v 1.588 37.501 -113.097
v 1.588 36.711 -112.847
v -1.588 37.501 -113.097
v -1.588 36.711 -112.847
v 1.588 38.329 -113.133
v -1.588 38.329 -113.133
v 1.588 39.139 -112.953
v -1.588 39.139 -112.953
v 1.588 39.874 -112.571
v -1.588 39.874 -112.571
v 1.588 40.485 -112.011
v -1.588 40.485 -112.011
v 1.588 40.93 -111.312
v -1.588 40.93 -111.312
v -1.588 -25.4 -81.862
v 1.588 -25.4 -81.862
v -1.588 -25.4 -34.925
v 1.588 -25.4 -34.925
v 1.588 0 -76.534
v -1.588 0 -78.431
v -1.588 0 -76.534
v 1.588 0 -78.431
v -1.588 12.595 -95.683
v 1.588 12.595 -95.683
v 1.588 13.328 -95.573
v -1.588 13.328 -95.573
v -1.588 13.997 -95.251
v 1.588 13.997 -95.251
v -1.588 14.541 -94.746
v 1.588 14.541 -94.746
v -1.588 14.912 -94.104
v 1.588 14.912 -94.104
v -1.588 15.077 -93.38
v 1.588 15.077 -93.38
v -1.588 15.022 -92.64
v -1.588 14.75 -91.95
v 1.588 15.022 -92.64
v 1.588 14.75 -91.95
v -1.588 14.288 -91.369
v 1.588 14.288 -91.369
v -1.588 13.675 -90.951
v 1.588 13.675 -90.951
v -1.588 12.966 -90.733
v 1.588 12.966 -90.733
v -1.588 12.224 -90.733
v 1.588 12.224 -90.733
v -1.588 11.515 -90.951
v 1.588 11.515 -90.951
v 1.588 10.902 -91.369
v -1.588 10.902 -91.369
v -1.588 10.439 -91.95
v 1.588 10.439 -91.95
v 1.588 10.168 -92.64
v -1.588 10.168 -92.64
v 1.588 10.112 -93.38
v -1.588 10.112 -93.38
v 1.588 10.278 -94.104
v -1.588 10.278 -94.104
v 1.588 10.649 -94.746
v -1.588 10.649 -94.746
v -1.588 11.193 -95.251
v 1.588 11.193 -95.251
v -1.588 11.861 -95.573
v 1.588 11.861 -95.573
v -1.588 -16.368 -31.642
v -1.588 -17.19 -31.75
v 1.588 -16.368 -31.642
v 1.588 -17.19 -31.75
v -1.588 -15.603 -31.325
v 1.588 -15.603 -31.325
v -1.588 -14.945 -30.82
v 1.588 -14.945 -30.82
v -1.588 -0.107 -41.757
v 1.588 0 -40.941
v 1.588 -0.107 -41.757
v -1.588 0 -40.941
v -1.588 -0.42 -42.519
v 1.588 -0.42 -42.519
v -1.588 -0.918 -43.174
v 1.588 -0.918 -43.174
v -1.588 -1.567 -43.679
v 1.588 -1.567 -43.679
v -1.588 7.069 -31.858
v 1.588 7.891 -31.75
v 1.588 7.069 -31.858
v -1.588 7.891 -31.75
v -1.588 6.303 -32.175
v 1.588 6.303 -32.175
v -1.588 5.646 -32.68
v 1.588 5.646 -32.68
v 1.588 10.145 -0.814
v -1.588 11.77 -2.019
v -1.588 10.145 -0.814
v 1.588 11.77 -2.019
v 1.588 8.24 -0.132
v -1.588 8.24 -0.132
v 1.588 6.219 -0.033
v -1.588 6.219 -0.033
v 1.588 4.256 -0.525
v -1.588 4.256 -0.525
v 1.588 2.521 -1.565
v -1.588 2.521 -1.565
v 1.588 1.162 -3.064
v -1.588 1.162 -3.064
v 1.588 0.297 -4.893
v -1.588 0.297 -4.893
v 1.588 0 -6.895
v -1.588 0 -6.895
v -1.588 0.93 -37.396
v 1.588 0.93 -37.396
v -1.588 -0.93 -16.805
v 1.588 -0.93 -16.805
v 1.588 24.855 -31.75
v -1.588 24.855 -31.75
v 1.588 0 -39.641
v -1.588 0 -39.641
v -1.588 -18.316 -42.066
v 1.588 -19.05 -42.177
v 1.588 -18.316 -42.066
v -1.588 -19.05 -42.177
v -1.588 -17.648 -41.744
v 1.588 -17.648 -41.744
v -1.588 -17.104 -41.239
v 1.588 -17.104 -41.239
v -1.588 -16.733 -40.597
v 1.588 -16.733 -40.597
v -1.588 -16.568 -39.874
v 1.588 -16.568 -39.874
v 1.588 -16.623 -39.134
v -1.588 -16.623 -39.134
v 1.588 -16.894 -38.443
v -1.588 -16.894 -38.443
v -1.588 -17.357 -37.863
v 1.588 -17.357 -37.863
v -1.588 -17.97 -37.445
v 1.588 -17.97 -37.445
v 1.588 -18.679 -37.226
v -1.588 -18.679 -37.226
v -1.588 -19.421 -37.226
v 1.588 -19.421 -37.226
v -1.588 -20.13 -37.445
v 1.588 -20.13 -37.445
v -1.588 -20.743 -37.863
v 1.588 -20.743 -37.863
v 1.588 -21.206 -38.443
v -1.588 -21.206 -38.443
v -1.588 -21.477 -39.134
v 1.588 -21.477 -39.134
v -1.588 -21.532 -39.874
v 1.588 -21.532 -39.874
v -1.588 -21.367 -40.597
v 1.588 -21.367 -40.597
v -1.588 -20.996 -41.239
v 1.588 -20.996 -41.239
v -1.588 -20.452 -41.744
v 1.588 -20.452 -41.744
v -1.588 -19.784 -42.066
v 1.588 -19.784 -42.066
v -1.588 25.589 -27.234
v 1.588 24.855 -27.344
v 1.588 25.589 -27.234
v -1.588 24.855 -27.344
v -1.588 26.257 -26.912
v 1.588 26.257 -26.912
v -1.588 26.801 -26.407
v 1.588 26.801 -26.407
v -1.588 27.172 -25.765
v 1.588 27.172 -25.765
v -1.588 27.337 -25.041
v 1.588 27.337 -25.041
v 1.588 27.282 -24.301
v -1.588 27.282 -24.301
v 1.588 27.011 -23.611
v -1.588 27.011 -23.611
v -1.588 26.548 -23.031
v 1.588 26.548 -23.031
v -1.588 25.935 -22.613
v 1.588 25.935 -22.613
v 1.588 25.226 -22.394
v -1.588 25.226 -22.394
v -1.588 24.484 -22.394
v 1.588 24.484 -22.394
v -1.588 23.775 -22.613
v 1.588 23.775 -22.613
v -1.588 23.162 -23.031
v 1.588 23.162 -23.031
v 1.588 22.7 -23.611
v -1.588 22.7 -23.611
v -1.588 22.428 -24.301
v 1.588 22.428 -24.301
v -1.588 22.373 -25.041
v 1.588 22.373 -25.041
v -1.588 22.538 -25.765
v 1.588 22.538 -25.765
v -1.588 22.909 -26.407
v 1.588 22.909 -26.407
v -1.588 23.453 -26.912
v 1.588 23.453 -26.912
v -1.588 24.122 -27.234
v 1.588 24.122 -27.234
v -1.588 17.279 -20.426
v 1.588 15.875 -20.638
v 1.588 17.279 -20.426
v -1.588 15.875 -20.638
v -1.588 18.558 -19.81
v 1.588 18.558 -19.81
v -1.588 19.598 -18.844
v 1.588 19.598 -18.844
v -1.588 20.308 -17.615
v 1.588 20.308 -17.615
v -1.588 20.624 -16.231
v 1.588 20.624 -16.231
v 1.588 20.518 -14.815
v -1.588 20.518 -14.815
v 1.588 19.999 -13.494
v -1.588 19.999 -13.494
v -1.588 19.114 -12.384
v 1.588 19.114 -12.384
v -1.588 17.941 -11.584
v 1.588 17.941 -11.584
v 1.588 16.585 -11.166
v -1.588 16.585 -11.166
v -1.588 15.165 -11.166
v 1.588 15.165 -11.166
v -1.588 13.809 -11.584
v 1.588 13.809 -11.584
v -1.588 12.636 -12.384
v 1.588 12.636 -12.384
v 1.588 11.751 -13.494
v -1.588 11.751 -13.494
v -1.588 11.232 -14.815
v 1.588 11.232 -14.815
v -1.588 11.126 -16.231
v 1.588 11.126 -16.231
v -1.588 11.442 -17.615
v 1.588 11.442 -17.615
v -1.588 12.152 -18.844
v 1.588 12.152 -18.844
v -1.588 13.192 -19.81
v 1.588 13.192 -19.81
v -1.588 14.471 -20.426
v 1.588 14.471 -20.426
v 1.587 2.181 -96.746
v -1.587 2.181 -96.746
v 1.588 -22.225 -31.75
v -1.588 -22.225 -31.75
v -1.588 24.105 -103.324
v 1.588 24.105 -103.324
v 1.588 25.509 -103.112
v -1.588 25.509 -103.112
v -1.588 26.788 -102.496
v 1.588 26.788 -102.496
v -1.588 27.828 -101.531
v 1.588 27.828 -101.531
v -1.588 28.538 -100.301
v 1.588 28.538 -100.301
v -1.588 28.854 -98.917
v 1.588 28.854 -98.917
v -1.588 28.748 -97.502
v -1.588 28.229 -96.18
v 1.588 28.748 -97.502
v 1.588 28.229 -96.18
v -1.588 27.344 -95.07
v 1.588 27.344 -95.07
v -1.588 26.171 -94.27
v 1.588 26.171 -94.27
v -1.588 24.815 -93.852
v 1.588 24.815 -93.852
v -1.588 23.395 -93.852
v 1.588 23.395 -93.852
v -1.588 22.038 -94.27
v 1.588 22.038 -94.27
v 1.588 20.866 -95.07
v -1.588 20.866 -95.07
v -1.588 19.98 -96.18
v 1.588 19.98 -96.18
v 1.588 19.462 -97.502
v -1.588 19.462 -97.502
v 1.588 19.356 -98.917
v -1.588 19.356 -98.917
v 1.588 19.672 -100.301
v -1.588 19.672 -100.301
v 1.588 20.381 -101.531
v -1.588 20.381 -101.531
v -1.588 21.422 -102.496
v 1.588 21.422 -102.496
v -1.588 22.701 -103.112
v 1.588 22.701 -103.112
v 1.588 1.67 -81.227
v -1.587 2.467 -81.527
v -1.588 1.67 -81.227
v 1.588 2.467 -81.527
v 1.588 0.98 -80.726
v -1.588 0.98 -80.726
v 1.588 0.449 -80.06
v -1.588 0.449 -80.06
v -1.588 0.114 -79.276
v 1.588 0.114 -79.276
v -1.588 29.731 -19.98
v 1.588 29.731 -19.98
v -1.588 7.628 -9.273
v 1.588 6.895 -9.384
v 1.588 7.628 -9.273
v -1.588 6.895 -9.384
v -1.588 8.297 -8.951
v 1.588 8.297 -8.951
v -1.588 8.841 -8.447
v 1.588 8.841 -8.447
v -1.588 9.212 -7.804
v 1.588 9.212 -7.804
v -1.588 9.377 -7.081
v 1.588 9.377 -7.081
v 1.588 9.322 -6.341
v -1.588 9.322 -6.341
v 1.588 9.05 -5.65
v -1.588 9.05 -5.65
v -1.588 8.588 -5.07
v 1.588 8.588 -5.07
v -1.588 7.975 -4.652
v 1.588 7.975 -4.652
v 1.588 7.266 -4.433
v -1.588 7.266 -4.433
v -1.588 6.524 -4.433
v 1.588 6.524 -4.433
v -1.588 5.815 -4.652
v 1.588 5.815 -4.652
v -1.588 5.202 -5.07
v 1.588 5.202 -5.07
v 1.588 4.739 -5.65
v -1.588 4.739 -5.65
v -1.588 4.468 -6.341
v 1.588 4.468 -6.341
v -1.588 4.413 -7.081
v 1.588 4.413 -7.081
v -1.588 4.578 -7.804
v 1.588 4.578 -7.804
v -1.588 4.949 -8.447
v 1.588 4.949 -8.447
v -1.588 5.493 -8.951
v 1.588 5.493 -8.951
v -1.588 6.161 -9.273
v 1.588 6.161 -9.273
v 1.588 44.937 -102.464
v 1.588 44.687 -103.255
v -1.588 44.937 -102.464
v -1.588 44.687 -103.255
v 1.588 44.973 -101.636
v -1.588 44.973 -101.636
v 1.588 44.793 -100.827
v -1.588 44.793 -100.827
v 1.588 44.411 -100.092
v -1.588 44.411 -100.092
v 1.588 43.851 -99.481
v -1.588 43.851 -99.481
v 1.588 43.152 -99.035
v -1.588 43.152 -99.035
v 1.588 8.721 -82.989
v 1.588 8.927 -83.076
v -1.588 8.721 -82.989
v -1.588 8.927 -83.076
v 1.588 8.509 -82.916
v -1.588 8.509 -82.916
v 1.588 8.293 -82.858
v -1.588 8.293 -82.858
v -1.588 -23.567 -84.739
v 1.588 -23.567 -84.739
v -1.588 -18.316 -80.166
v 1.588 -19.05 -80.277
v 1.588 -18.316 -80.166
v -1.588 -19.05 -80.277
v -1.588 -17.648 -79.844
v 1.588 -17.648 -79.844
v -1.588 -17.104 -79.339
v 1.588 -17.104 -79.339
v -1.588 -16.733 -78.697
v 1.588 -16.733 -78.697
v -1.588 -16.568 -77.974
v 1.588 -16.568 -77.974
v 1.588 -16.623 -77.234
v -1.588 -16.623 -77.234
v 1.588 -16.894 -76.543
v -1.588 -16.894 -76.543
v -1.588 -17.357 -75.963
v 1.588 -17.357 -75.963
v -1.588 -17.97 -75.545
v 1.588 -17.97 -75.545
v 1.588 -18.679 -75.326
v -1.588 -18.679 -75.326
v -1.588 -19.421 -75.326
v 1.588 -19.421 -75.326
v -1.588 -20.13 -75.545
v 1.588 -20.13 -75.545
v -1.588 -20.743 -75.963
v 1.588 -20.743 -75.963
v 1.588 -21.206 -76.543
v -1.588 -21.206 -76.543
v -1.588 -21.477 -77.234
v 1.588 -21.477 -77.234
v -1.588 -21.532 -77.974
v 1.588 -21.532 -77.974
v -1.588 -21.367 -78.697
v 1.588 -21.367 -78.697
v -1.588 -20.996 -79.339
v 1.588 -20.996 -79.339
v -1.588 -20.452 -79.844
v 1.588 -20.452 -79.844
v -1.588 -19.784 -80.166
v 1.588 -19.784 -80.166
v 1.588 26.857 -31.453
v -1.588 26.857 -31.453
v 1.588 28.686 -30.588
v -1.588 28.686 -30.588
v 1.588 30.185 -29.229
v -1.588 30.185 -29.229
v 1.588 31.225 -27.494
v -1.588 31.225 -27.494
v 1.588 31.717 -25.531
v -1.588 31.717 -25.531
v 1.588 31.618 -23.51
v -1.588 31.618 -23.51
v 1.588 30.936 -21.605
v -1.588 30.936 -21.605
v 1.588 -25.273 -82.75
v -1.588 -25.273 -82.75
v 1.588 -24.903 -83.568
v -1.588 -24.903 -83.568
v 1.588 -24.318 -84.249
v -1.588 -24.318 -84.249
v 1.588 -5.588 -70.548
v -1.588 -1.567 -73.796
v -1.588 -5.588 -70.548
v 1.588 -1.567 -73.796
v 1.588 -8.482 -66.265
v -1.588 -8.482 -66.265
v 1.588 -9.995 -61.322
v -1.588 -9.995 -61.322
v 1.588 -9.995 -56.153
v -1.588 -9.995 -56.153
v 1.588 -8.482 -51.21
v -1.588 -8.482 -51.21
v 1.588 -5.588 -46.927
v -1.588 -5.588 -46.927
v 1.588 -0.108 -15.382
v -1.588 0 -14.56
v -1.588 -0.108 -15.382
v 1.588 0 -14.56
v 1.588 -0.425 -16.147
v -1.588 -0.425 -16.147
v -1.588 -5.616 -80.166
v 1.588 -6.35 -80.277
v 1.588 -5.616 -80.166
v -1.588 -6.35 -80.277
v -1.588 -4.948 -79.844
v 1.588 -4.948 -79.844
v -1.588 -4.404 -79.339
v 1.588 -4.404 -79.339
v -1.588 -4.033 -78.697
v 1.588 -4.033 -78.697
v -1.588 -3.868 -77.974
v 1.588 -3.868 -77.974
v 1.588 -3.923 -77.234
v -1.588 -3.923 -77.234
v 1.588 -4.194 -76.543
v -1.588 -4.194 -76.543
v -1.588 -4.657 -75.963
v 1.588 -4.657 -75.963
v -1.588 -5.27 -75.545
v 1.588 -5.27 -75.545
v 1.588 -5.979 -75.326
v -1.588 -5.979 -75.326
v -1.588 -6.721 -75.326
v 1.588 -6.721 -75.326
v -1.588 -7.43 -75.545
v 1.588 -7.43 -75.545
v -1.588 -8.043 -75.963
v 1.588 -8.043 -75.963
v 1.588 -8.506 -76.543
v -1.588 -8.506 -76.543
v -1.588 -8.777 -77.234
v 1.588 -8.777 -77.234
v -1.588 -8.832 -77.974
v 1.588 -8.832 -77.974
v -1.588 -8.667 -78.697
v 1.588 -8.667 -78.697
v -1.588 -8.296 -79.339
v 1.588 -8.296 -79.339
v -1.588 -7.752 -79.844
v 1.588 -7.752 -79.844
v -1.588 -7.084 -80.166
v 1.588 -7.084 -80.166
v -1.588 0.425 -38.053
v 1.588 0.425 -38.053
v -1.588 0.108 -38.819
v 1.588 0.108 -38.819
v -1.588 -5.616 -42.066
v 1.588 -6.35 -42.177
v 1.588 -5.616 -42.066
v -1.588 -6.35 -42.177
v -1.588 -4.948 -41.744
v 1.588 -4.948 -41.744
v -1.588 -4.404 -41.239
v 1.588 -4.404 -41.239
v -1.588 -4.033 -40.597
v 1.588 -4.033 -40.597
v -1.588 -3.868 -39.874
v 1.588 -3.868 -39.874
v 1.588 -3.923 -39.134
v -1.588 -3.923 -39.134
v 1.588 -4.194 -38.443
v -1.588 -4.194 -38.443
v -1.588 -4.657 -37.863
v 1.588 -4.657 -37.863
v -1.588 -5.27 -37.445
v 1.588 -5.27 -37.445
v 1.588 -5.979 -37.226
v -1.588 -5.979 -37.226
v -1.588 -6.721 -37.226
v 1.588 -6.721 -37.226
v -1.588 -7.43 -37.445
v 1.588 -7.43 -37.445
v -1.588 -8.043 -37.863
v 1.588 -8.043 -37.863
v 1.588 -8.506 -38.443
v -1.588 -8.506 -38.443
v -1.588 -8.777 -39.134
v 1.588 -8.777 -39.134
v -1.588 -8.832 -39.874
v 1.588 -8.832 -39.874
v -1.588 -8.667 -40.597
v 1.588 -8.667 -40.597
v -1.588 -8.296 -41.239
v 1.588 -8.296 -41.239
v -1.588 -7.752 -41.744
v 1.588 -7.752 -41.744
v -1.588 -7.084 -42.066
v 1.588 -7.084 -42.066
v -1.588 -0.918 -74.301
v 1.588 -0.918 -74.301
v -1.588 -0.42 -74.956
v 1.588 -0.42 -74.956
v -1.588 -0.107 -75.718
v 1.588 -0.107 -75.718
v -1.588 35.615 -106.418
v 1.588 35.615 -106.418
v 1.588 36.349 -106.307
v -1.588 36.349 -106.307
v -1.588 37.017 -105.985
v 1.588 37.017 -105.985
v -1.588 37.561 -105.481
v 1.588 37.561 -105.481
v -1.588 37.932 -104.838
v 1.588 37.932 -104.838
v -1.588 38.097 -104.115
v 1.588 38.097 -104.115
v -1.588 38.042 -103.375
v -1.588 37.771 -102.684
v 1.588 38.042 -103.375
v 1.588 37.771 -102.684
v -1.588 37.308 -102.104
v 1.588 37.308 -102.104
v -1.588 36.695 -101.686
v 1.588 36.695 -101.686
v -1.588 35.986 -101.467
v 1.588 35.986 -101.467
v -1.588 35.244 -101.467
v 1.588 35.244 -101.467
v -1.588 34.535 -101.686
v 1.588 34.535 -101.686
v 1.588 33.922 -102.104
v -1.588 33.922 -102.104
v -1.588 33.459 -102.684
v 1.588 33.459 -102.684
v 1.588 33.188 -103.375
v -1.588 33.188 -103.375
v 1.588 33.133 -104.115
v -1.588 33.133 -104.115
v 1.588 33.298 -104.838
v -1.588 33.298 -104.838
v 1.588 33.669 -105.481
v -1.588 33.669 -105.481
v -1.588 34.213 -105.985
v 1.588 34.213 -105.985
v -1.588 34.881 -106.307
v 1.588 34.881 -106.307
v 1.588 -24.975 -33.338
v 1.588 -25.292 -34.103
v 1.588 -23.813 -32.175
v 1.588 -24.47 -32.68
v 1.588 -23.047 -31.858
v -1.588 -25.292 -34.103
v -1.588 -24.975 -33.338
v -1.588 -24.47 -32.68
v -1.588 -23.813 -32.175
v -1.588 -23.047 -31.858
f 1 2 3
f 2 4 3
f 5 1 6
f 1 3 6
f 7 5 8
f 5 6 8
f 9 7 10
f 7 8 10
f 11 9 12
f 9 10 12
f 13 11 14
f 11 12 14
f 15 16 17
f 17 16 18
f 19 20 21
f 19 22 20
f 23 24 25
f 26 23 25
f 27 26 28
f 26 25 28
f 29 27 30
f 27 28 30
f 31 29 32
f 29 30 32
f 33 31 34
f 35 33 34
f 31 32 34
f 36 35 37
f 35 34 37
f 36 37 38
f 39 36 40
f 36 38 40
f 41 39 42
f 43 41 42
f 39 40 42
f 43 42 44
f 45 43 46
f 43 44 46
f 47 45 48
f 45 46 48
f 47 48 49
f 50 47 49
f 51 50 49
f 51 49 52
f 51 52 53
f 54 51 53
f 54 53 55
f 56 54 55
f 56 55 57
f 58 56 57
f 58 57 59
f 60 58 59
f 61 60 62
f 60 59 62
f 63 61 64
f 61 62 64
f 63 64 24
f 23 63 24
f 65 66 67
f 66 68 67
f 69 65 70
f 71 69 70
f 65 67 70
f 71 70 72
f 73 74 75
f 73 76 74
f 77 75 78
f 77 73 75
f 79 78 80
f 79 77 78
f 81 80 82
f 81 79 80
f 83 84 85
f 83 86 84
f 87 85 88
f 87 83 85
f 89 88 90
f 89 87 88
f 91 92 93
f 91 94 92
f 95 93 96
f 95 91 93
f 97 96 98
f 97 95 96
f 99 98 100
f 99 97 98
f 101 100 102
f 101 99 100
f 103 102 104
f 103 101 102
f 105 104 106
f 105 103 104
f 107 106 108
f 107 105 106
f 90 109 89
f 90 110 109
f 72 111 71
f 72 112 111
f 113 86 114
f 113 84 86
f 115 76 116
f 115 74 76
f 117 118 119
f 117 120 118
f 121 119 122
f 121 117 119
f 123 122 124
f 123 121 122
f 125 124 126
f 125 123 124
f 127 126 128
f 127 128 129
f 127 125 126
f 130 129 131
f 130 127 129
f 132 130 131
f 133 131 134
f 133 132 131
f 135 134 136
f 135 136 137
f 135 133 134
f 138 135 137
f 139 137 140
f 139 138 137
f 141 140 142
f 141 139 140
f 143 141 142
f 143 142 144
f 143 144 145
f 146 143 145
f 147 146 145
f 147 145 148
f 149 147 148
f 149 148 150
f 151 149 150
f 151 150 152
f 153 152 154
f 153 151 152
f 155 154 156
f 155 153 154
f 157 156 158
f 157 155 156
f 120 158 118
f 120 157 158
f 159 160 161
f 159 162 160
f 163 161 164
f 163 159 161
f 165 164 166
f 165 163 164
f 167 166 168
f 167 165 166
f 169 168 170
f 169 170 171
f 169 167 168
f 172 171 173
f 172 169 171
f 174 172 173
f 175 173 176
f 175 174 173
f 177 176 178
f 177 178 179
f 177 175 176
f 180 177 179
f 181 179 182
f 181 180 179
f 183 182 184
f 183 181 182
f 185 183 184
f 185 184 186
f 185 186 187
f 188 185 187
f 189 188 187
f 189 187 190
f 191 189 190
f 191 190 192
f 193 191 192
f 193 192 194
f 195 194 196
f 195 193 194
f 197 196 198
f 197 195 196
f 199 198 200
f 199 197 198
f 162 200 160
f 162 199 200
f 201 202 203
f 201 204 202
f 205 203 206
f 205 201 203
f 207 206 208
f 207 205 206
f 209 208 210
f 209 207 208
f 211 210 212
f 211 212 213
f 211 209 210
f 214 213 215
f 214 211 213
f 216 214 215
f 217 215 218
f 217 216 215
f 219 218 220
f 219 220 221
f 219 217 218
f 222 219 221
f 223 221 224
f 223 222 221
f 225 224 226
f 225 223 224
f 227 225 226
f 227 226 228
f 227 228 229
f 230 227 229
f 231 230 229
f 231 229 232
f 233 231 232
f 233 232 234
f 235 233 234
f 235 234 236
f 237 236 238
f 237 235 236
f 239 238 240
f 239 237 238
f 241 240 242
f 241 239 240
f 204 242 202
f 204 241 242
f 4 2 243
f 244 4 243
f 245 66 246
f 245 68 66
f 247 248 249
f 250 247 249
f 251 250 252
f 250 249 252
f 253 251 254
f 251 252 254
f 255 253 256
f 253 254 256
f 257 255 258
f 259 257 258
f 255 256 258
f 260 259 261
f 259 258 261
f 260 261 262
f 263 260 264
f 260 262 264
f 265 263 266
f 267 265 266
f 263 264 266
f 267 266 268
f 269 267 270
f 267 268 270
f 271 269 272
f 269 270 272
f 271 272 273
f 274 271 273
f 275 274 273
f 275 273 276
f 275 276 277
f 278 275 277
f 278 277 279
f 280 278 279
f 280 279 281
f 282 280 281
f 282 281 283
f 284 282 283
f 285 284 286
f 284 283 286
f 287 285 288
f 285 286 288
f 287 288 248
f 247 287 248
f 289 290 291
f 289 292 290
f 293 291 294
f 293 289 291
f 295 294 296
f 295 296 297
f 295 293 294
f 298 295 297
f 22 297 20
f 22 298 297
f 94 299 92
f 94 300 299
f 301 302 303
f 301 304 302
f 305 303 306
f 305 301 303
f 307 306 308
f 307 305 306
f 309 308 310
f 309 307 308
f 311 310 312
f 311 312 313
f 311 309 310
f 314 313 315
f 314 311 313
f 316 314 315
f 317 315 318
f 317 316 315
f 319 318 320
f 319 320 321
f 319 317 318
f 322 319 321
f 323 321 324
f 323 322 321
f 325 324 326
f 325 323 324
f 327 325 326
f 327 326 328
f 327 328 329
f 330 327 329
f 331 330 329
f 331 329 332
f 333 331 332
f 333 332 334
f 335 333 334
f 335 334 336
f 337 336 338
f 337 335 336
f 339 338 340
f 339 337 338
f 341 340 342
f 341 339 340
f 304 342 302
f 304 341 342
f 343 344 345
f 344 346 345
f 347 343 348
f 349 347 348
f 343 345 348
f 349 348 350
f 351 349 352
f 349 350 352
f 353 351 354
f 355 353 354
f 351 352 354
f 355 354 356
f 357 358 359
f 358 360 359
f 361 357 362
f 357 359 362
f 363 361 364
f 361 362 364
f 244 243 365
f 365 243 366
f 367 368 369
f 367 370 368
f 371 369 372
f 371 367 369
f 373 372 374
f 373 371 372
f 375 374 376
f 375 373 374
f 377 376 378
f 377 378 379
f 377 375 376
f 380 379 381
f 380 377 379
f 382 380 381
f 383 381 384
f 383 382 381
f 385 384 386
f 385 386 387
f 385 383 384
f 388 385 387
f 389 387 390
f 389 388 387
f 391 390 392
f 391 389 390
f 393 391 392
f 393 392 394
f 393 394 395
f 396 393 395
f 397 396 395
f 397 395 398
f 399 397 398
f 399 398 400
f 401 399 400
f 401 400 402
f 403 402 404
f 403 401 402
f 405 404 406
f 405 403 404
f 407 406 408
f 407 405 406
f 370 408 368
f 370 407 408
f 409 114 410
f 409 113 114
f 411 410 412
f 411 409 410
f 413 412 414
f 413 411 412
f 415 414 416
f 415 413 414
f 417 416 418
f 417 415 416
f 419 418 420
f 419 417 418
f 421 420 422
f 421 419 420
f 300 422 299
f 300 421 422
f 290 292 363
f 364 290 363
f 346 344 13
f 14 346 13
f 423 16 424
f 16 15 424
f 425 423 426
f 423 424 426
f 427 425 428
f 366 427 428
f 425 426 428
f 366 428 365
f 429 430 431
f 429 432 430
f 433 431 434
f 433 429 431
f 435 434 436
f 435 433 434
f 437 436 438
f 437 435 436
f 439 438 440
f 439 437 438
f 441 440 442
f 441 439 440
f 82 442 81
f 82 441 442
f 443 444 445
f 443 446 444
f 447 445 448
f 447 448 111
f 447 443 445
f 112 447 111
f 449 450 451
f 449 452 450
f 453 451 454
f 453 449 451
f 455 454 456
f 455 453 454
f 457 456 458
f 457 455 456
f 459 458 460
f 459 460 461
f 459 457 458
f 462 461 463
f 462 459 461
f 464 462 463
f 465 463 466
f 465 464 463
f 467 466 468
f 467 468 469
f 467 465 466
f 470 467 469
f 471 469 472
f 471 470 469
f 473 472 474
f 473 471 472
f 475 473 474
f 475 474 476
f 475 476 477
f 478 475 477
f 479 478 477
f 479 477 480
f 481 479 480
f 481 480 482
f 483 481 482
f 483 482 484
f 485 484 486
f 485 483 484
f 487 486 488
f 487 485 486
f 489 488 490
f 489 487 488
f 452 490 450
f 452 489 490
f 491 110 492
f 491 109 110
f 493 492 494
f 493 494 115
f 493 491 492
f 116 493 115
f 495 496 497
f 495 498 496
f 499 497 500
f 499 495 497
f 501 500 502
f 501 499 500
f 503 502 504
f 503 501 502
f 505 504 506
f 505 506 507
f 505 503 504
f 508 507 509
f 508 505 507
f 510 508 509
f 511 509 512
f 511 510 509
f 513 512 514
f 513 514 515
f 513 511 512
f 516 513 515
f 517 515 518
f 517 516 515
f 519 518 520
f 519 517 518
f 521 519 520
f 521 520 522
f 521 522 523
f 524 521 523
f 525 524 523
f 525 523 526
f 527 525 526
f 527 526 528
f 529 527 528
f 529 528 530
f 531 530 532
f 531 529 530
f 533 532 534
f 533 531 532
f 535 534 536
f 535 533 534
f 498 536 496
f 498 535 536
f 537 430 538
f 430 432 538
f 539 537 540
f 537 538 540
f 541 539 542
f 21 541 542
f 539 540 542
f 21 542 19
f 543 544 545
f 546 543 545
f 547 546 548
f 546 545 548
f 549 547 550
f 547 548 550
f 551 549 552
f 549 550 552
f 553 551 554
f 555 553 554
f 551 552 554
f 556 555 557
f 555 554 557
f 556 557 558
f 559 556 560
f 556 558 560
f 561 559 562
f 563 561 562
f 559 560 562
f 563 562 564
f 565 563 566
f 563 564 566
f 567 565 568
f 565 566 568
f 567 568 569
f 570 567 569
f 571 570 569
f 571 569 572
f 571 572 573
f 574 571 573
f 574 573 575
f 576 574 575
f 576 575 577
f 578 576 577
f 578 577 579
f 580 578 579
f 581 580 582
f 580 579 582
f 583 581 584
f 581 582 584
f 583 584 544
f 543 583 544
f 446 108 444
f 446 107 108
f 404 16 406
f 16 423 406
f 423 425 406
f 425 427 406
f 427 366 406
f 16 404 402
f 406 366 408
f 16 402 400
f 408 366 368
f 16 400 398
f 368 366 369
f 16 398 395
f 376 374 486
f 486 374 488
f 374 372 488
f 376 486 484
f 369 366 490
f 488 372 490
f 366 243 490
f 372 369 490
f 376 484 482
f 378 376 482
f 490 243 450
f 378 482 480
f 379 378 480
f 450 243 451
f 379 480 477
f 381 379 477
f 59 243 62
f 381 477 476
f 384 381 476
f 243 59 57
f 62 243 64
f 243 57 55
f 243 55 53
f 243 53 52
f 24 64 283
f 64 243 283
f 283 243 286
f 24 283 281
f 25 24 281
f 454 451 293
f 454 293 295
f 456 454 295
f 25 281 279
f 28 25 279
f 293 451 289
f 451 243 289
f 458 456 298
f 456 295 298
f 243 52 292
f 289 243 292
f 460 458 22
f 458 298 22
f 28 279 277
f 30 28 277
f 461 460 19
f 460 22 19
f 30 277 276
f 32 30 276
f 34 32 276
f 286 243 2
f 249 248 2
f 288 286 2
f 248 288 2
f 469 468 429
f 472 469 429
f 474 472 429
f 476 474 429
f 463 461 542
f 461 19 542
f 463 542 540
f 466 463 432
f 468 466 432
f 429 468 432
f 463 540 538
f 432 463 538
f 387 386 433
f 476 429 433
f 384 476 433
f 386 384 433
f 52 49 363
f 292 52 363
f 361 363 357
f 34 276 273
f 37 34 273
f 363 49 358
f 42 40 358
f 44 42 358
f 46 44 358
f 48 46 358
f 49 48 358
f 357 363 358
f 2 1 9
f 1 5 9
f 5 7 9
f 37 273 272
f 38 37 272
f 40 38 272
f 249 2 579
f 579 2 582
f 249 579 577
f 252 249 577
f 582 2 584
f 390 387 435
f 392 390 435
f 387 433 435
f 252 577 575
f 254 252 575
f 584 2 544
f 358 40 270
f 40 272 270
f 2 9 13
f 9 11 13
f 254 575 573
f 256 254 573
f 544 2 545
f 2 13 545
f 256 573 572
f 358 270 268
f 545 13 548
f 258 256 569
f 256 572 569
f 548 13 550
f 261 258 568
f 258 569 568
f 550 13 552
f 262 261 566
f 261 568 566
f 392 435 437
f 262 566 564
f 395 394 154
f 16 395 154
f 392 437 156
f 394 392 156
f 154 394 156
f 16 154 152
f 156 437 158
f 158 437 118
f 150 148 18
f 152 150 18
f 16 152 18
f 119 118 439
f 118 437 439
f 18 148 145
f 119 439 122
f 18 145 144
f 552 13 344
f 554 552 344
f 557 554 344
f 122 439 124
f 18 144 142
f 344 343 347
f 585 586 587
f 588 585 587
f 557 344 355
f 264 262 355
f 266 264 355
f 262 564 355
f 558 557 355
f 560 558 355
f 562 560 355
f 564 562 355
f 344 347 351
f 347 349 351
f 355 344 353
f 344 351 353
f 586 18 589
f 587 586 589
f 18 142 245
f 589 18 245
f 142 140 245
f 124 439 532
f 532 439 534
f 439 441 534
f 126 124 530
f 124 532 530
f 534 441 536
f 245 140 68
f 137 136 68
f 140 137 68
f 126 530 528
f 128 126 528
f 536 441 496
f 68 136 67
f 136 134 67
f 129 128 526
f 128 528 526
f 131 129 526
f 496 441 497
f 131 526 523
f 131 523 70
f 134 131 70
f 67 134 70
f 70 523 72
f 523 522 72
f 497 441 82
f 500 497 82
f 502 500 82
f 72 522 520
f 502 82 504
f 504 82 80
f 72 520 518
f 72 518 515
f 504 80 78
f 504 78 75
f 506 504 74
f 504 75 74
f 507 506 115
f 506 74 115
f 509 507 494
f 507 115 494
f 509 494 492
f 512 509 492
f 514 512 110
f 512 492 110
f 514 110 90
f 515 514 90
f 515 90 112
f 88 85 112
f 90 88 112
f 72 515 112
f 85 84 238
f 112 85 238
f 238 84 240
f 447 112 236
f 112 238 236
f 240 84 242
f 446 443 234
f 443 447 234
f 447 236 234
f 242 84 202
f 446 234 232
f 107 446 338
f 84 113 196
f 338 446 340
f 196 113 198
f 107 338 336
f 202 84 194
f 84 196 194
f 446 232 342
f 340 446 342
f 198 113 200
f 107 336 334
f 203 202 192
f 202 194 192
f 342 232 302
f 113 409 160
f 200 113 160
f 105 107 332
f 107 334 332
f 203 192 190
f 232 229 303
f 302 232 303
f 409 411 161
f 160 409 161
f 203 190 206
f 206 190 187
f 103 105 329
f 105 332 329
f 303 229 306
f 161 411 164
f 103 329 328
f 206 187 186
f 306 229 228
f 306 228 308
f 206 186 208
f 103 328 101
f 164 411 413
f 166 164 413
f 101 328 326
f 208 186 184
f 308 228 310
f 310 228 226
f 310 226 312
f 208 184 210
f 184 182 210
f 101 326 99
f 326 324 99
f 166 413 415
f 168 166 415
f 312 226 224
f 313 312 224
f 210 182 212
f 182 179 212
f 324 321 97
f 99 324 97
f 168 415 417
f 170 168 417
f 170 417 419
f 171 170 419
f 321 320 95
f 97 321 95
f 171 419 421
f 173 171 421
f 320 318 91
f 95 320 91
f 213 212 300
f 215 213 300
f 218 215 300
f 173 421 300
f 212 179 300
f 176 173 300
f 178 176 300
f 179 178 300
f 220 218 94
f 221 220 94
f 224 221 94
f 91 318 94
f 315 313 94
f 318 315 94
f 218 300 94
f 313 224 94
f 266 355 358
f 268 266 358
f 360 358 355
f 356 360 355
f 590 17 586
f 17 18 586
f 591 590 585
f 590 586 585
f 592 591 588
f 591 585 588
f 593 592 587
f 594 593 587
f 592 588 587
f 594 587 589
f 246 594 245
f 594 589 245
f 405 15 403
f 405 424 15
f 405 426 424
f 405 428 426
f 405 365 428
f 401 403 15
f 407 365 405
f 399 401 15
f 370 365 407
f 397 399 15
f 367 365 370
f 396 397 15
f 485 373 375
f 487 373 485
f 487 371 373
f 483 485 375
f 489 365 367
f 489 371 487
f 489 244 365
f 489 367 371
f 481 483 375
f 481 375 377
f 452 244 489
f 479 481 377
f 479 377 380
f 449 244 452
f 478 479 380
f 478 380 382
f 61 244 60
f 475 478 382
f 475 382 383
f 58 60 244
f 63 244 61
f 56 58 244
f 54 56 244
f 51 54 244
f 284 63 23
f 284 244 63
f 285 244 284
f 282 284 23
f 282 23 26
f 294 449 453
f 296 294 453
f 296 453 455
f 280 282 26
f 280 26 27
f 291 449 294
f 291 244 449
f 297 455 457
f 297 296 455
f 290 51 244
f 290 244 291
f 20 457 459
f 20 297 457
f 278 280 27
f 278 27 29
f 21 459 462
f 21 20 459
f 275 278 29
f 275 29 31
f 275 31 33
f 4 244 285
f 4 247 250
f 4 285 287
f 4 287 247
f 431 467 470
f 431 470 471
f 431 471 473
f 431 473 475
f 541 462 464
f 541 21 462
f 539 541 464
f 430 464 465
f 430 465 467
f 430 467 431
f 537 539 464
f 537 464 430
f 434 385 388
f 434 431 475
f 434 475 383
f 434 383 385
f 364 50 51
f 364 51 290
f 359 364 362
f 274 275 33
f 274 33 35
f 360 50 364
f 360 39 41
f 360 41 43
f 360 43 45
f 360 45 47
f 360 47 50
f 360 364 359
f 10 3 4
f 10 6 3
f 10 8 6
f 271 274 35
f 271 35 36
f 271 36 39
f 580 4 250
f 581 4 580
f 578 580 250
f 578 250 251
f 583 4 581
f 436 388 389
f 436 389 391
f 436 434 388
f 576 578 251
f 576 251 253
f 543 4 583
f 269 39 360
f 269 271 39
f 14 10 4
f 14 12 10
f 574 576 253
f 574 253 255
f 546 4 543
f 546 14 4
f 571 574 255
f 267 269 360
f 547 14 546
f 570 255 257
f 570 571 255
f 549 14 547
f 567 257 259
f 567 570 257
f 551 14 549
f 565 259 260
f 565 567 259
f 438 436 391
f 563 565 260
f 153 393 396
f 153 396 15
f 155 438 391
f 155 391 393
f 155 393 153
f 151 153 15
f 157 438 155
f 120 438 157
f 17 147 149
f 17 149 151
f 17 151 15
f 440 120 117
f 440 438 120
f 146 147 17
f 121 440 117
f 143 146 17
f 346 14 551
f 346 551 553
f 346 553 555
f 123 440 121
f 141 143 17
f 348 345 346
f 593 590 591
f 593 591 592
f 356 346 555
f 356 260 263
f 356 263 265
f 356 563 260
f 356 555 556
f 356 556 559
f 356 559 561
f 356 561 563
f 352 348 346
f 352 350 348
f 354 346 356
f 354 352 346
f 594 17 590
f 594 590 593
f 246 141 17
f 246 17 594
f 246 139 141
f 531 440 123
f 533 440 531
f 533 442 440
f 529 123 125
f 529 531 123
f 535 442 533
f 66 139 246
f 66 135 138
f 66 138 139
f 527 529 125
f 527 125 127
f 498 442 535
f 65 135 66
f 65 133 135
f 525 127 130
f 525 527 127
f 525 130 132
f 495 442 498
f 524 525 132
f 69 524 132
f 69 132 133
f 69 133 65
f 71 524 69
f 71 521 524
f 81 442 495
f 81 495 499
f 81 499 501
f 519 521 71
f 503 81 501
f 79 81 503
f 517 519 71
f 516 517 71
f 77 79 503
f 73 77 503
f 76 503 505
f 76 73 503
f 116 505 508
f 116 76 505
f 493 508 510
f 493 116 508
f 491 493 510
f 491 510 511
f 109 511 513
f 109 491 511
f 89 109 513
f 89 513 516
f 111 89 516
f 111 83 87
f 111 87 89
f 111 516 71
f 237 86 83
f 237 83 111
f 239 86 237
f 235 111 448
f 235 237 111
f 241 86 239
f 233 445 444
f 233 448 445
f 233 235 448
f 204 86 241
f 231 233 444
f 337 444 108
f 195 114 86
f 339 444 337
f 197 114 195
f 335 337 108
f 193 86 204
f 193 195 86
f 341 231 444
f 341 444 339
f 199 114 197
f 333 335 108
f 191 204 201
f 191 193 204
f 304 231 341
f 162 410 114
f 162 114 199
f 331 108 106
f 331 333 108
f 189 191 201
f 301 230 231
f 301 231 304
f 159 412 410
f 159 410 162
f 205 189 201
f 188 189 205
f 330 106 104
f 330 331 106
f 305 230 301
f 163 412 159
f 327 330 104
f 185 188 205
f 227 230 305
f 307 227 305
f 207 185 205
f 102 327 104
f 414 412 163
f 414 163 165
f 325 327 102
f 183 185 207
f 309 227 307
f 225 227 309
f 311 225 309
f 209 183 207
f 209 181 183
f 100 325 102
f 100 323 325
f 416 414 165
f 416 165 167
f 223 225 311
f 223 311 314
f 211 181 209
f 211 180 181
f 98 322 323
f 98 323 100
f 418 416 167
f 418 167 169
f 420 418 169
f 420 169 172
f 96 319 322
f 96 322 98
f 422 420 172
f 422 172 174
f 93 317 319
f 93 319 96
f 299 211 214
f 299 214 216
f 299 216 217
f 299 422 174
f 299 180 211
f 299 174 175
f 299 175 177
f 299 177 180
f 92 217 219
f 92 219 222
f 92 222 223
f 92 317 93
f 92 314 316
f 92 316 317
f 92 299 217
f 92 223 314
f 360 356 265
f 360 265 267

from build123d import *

# Parameters (mm, degrees)
SKETCH1_R           = 2.4892
SKETCH1_R_2         = 4.7625
BOSS_EXTRUDE1_DEPTH = 1.5875
FILLET1_R           = 3.175
SKETCH2_R           = 4.7625
SKETCH2_R_2         = 2.4892
BOSS_EXTRUDE2_DEPTH = 3.175
FILLET2_R           = 3.175


with BuildPart() as part:
    # Sketch1 → Boss-Extrude1 (new, symmetric)
    with BuildSketch(Plane(origin=(0, 0, 0), x_dir=(0, 0, -1), z_dir=(1, 0, 0))):
        with BuildLine():
            Line((6.894743879, 0), (15.875, 0))
            Line((15.875, 0), (31.75, -15.875))
            Line((31.75, -15.875), (31.75, -25.4))
            Line((31.75, -25.4), (84.1375, -25.4))
            Line((84.1375, -25.4), (84.1375, 0))
            Line((84.1375, 0), (74.6125, 0))
            ThreePointArc((74.6125, 0), (58.7375, -10.187661084), (42.8625, 0))
            Line((42.8625, 0), (38.325640303, 0))
            Line((38.325640303, 0), (31.75, 6.575640303))
            Line((31.75, 6.575640303), (31.75, 24.855256121))
            ThreePointArc((31.75, 24.855256121), (27.493760374, 31.225168873), (19.97993597, 29.730576272))
            Line((19.97993597, 29.730576272), (2.019423728, 11.77006403))
            ThreePointArc((2.019423728, 11.77006403), (0.524831127, 4.256239626), (6.894743879, 0))
        make_face()
        with Locations((6.894743879, 6.894743879)):
            Circle(SKETCH1_R, mode=Mode.SUBTRACT)
        with Locations((15.875, 15.875)):
            Circle(SKETCH1_R_2, mode=Mode.SUBTRACT)
        with Locations((24.855256121, 24.855256121)):
            Circle(SKETCH1_R, mode=Mode.SUBTRACT)
        with Locations((77.7875, -19.05)):
            Circle(SKETCH1_R, mode=Mode.SUBTRACT)
        with Locations((77.7875, -6.35)):
            Circle(SKETCH1_R, mode=Mode.SUBTRACT)
        with Locations((39.6875, -19.05)):
            Circle(SKETCH1_R, mode=Mode.SUBTRACT)
        with Locations((39.6875, -6.35)):
            Circle(SKETCH1_R, mode=Mode.SUBTRACT)
    extrude(amount=BOSS_EXTRUDE1_DEPTH, both=True)

    # Fillet1
    fillet1_edges = [part.edges().sort_by_distance(p)[0] for p in [
        (0, 0, -42.8625),
        (0, 0, -74.6125),
        (0, 0, -84.1375),
        (0, -25.4, -84.1375),
        (0, -25.4, -31.75),
        (0, -15.875, -31.75),
        (0, 0, -15.875),
        (0, 6.575640303, -31.75),
        (0, 0, -38.325640303),
    ]]
    fillet(fillet1_edges, radius=FILLET1_R)

    # Sketch2 → Boss-Extrude2 (add)
    # profile 1 of 2: a face of its own
    with BuildSketch(Plane(origin=(1.5875, 0, 0), x_dir=(0, 0, -1), z_dir=(1, 0, 0))):
        with BuildLine():
            Line((83.884613573, -25.4), (80.9625, -25.4))
            ThreePointArc((80.9625, -25.4), (83.20756403, -24.47006403), (84.1375, -22.225))
            Line((84.1375, -22.225), (84.1375, -3.175))
            ThreePointArc((84.1375, -3.175), (83.20756403, -0.92993597), (80.9625, 0))
            Line((80.9625, 0), (82.933508182, 8.621260033))
            Line((82.933508182, 8.621260033), (96.745638856, 2.180557724))
            Line((96.745638856, 2.180557724), (83.884613573, -25.4))
        make_face()
    # profile 2 of 2: a face of its own
    with BuildSketch(Plane(origin=(1.5875, 0, 0), x_dir=(0, 0, -1), z_dir=(1, 0, 0))):
        Polygon((100.377076935, 46.029113943), (114.18920761, 39.588411634), (96.745638856, 2.180557724), (82.933508182, 8.621260033), align=None)
        with Locations((98.561357896, 24.104835834)):
            Circle(SKETCH2_R, mode=Mode.SUBTRACT)
        with Locations((93.194105972, 12.594726938)):
            Circle(SKETCH2_R_2, mode=Mode.SUBTRACT)
        with Locations((103.92860982, 35.614944729)):
            Circle(SKETCH2_R_2, mode=Mode.SUBTRACT)
    extrude(amount=-BOSS_EXTRUDE2_DEPTH)

    # Fillet2
    fillet2_edges = [part.edges().sort_by_distance(p)[0] for p in [
        (0, 39.588411634, -114.18920761),
        (0, 46.029113943, -100.377076935),
        (0, 8.621260033, -82.933508182),
        (0, -25.4, -83.884613573),
        (0, 0, -80.9625),
    ]]
    fillet(fillet2_edges, radius=FILLET2_R)


solid = part.part
